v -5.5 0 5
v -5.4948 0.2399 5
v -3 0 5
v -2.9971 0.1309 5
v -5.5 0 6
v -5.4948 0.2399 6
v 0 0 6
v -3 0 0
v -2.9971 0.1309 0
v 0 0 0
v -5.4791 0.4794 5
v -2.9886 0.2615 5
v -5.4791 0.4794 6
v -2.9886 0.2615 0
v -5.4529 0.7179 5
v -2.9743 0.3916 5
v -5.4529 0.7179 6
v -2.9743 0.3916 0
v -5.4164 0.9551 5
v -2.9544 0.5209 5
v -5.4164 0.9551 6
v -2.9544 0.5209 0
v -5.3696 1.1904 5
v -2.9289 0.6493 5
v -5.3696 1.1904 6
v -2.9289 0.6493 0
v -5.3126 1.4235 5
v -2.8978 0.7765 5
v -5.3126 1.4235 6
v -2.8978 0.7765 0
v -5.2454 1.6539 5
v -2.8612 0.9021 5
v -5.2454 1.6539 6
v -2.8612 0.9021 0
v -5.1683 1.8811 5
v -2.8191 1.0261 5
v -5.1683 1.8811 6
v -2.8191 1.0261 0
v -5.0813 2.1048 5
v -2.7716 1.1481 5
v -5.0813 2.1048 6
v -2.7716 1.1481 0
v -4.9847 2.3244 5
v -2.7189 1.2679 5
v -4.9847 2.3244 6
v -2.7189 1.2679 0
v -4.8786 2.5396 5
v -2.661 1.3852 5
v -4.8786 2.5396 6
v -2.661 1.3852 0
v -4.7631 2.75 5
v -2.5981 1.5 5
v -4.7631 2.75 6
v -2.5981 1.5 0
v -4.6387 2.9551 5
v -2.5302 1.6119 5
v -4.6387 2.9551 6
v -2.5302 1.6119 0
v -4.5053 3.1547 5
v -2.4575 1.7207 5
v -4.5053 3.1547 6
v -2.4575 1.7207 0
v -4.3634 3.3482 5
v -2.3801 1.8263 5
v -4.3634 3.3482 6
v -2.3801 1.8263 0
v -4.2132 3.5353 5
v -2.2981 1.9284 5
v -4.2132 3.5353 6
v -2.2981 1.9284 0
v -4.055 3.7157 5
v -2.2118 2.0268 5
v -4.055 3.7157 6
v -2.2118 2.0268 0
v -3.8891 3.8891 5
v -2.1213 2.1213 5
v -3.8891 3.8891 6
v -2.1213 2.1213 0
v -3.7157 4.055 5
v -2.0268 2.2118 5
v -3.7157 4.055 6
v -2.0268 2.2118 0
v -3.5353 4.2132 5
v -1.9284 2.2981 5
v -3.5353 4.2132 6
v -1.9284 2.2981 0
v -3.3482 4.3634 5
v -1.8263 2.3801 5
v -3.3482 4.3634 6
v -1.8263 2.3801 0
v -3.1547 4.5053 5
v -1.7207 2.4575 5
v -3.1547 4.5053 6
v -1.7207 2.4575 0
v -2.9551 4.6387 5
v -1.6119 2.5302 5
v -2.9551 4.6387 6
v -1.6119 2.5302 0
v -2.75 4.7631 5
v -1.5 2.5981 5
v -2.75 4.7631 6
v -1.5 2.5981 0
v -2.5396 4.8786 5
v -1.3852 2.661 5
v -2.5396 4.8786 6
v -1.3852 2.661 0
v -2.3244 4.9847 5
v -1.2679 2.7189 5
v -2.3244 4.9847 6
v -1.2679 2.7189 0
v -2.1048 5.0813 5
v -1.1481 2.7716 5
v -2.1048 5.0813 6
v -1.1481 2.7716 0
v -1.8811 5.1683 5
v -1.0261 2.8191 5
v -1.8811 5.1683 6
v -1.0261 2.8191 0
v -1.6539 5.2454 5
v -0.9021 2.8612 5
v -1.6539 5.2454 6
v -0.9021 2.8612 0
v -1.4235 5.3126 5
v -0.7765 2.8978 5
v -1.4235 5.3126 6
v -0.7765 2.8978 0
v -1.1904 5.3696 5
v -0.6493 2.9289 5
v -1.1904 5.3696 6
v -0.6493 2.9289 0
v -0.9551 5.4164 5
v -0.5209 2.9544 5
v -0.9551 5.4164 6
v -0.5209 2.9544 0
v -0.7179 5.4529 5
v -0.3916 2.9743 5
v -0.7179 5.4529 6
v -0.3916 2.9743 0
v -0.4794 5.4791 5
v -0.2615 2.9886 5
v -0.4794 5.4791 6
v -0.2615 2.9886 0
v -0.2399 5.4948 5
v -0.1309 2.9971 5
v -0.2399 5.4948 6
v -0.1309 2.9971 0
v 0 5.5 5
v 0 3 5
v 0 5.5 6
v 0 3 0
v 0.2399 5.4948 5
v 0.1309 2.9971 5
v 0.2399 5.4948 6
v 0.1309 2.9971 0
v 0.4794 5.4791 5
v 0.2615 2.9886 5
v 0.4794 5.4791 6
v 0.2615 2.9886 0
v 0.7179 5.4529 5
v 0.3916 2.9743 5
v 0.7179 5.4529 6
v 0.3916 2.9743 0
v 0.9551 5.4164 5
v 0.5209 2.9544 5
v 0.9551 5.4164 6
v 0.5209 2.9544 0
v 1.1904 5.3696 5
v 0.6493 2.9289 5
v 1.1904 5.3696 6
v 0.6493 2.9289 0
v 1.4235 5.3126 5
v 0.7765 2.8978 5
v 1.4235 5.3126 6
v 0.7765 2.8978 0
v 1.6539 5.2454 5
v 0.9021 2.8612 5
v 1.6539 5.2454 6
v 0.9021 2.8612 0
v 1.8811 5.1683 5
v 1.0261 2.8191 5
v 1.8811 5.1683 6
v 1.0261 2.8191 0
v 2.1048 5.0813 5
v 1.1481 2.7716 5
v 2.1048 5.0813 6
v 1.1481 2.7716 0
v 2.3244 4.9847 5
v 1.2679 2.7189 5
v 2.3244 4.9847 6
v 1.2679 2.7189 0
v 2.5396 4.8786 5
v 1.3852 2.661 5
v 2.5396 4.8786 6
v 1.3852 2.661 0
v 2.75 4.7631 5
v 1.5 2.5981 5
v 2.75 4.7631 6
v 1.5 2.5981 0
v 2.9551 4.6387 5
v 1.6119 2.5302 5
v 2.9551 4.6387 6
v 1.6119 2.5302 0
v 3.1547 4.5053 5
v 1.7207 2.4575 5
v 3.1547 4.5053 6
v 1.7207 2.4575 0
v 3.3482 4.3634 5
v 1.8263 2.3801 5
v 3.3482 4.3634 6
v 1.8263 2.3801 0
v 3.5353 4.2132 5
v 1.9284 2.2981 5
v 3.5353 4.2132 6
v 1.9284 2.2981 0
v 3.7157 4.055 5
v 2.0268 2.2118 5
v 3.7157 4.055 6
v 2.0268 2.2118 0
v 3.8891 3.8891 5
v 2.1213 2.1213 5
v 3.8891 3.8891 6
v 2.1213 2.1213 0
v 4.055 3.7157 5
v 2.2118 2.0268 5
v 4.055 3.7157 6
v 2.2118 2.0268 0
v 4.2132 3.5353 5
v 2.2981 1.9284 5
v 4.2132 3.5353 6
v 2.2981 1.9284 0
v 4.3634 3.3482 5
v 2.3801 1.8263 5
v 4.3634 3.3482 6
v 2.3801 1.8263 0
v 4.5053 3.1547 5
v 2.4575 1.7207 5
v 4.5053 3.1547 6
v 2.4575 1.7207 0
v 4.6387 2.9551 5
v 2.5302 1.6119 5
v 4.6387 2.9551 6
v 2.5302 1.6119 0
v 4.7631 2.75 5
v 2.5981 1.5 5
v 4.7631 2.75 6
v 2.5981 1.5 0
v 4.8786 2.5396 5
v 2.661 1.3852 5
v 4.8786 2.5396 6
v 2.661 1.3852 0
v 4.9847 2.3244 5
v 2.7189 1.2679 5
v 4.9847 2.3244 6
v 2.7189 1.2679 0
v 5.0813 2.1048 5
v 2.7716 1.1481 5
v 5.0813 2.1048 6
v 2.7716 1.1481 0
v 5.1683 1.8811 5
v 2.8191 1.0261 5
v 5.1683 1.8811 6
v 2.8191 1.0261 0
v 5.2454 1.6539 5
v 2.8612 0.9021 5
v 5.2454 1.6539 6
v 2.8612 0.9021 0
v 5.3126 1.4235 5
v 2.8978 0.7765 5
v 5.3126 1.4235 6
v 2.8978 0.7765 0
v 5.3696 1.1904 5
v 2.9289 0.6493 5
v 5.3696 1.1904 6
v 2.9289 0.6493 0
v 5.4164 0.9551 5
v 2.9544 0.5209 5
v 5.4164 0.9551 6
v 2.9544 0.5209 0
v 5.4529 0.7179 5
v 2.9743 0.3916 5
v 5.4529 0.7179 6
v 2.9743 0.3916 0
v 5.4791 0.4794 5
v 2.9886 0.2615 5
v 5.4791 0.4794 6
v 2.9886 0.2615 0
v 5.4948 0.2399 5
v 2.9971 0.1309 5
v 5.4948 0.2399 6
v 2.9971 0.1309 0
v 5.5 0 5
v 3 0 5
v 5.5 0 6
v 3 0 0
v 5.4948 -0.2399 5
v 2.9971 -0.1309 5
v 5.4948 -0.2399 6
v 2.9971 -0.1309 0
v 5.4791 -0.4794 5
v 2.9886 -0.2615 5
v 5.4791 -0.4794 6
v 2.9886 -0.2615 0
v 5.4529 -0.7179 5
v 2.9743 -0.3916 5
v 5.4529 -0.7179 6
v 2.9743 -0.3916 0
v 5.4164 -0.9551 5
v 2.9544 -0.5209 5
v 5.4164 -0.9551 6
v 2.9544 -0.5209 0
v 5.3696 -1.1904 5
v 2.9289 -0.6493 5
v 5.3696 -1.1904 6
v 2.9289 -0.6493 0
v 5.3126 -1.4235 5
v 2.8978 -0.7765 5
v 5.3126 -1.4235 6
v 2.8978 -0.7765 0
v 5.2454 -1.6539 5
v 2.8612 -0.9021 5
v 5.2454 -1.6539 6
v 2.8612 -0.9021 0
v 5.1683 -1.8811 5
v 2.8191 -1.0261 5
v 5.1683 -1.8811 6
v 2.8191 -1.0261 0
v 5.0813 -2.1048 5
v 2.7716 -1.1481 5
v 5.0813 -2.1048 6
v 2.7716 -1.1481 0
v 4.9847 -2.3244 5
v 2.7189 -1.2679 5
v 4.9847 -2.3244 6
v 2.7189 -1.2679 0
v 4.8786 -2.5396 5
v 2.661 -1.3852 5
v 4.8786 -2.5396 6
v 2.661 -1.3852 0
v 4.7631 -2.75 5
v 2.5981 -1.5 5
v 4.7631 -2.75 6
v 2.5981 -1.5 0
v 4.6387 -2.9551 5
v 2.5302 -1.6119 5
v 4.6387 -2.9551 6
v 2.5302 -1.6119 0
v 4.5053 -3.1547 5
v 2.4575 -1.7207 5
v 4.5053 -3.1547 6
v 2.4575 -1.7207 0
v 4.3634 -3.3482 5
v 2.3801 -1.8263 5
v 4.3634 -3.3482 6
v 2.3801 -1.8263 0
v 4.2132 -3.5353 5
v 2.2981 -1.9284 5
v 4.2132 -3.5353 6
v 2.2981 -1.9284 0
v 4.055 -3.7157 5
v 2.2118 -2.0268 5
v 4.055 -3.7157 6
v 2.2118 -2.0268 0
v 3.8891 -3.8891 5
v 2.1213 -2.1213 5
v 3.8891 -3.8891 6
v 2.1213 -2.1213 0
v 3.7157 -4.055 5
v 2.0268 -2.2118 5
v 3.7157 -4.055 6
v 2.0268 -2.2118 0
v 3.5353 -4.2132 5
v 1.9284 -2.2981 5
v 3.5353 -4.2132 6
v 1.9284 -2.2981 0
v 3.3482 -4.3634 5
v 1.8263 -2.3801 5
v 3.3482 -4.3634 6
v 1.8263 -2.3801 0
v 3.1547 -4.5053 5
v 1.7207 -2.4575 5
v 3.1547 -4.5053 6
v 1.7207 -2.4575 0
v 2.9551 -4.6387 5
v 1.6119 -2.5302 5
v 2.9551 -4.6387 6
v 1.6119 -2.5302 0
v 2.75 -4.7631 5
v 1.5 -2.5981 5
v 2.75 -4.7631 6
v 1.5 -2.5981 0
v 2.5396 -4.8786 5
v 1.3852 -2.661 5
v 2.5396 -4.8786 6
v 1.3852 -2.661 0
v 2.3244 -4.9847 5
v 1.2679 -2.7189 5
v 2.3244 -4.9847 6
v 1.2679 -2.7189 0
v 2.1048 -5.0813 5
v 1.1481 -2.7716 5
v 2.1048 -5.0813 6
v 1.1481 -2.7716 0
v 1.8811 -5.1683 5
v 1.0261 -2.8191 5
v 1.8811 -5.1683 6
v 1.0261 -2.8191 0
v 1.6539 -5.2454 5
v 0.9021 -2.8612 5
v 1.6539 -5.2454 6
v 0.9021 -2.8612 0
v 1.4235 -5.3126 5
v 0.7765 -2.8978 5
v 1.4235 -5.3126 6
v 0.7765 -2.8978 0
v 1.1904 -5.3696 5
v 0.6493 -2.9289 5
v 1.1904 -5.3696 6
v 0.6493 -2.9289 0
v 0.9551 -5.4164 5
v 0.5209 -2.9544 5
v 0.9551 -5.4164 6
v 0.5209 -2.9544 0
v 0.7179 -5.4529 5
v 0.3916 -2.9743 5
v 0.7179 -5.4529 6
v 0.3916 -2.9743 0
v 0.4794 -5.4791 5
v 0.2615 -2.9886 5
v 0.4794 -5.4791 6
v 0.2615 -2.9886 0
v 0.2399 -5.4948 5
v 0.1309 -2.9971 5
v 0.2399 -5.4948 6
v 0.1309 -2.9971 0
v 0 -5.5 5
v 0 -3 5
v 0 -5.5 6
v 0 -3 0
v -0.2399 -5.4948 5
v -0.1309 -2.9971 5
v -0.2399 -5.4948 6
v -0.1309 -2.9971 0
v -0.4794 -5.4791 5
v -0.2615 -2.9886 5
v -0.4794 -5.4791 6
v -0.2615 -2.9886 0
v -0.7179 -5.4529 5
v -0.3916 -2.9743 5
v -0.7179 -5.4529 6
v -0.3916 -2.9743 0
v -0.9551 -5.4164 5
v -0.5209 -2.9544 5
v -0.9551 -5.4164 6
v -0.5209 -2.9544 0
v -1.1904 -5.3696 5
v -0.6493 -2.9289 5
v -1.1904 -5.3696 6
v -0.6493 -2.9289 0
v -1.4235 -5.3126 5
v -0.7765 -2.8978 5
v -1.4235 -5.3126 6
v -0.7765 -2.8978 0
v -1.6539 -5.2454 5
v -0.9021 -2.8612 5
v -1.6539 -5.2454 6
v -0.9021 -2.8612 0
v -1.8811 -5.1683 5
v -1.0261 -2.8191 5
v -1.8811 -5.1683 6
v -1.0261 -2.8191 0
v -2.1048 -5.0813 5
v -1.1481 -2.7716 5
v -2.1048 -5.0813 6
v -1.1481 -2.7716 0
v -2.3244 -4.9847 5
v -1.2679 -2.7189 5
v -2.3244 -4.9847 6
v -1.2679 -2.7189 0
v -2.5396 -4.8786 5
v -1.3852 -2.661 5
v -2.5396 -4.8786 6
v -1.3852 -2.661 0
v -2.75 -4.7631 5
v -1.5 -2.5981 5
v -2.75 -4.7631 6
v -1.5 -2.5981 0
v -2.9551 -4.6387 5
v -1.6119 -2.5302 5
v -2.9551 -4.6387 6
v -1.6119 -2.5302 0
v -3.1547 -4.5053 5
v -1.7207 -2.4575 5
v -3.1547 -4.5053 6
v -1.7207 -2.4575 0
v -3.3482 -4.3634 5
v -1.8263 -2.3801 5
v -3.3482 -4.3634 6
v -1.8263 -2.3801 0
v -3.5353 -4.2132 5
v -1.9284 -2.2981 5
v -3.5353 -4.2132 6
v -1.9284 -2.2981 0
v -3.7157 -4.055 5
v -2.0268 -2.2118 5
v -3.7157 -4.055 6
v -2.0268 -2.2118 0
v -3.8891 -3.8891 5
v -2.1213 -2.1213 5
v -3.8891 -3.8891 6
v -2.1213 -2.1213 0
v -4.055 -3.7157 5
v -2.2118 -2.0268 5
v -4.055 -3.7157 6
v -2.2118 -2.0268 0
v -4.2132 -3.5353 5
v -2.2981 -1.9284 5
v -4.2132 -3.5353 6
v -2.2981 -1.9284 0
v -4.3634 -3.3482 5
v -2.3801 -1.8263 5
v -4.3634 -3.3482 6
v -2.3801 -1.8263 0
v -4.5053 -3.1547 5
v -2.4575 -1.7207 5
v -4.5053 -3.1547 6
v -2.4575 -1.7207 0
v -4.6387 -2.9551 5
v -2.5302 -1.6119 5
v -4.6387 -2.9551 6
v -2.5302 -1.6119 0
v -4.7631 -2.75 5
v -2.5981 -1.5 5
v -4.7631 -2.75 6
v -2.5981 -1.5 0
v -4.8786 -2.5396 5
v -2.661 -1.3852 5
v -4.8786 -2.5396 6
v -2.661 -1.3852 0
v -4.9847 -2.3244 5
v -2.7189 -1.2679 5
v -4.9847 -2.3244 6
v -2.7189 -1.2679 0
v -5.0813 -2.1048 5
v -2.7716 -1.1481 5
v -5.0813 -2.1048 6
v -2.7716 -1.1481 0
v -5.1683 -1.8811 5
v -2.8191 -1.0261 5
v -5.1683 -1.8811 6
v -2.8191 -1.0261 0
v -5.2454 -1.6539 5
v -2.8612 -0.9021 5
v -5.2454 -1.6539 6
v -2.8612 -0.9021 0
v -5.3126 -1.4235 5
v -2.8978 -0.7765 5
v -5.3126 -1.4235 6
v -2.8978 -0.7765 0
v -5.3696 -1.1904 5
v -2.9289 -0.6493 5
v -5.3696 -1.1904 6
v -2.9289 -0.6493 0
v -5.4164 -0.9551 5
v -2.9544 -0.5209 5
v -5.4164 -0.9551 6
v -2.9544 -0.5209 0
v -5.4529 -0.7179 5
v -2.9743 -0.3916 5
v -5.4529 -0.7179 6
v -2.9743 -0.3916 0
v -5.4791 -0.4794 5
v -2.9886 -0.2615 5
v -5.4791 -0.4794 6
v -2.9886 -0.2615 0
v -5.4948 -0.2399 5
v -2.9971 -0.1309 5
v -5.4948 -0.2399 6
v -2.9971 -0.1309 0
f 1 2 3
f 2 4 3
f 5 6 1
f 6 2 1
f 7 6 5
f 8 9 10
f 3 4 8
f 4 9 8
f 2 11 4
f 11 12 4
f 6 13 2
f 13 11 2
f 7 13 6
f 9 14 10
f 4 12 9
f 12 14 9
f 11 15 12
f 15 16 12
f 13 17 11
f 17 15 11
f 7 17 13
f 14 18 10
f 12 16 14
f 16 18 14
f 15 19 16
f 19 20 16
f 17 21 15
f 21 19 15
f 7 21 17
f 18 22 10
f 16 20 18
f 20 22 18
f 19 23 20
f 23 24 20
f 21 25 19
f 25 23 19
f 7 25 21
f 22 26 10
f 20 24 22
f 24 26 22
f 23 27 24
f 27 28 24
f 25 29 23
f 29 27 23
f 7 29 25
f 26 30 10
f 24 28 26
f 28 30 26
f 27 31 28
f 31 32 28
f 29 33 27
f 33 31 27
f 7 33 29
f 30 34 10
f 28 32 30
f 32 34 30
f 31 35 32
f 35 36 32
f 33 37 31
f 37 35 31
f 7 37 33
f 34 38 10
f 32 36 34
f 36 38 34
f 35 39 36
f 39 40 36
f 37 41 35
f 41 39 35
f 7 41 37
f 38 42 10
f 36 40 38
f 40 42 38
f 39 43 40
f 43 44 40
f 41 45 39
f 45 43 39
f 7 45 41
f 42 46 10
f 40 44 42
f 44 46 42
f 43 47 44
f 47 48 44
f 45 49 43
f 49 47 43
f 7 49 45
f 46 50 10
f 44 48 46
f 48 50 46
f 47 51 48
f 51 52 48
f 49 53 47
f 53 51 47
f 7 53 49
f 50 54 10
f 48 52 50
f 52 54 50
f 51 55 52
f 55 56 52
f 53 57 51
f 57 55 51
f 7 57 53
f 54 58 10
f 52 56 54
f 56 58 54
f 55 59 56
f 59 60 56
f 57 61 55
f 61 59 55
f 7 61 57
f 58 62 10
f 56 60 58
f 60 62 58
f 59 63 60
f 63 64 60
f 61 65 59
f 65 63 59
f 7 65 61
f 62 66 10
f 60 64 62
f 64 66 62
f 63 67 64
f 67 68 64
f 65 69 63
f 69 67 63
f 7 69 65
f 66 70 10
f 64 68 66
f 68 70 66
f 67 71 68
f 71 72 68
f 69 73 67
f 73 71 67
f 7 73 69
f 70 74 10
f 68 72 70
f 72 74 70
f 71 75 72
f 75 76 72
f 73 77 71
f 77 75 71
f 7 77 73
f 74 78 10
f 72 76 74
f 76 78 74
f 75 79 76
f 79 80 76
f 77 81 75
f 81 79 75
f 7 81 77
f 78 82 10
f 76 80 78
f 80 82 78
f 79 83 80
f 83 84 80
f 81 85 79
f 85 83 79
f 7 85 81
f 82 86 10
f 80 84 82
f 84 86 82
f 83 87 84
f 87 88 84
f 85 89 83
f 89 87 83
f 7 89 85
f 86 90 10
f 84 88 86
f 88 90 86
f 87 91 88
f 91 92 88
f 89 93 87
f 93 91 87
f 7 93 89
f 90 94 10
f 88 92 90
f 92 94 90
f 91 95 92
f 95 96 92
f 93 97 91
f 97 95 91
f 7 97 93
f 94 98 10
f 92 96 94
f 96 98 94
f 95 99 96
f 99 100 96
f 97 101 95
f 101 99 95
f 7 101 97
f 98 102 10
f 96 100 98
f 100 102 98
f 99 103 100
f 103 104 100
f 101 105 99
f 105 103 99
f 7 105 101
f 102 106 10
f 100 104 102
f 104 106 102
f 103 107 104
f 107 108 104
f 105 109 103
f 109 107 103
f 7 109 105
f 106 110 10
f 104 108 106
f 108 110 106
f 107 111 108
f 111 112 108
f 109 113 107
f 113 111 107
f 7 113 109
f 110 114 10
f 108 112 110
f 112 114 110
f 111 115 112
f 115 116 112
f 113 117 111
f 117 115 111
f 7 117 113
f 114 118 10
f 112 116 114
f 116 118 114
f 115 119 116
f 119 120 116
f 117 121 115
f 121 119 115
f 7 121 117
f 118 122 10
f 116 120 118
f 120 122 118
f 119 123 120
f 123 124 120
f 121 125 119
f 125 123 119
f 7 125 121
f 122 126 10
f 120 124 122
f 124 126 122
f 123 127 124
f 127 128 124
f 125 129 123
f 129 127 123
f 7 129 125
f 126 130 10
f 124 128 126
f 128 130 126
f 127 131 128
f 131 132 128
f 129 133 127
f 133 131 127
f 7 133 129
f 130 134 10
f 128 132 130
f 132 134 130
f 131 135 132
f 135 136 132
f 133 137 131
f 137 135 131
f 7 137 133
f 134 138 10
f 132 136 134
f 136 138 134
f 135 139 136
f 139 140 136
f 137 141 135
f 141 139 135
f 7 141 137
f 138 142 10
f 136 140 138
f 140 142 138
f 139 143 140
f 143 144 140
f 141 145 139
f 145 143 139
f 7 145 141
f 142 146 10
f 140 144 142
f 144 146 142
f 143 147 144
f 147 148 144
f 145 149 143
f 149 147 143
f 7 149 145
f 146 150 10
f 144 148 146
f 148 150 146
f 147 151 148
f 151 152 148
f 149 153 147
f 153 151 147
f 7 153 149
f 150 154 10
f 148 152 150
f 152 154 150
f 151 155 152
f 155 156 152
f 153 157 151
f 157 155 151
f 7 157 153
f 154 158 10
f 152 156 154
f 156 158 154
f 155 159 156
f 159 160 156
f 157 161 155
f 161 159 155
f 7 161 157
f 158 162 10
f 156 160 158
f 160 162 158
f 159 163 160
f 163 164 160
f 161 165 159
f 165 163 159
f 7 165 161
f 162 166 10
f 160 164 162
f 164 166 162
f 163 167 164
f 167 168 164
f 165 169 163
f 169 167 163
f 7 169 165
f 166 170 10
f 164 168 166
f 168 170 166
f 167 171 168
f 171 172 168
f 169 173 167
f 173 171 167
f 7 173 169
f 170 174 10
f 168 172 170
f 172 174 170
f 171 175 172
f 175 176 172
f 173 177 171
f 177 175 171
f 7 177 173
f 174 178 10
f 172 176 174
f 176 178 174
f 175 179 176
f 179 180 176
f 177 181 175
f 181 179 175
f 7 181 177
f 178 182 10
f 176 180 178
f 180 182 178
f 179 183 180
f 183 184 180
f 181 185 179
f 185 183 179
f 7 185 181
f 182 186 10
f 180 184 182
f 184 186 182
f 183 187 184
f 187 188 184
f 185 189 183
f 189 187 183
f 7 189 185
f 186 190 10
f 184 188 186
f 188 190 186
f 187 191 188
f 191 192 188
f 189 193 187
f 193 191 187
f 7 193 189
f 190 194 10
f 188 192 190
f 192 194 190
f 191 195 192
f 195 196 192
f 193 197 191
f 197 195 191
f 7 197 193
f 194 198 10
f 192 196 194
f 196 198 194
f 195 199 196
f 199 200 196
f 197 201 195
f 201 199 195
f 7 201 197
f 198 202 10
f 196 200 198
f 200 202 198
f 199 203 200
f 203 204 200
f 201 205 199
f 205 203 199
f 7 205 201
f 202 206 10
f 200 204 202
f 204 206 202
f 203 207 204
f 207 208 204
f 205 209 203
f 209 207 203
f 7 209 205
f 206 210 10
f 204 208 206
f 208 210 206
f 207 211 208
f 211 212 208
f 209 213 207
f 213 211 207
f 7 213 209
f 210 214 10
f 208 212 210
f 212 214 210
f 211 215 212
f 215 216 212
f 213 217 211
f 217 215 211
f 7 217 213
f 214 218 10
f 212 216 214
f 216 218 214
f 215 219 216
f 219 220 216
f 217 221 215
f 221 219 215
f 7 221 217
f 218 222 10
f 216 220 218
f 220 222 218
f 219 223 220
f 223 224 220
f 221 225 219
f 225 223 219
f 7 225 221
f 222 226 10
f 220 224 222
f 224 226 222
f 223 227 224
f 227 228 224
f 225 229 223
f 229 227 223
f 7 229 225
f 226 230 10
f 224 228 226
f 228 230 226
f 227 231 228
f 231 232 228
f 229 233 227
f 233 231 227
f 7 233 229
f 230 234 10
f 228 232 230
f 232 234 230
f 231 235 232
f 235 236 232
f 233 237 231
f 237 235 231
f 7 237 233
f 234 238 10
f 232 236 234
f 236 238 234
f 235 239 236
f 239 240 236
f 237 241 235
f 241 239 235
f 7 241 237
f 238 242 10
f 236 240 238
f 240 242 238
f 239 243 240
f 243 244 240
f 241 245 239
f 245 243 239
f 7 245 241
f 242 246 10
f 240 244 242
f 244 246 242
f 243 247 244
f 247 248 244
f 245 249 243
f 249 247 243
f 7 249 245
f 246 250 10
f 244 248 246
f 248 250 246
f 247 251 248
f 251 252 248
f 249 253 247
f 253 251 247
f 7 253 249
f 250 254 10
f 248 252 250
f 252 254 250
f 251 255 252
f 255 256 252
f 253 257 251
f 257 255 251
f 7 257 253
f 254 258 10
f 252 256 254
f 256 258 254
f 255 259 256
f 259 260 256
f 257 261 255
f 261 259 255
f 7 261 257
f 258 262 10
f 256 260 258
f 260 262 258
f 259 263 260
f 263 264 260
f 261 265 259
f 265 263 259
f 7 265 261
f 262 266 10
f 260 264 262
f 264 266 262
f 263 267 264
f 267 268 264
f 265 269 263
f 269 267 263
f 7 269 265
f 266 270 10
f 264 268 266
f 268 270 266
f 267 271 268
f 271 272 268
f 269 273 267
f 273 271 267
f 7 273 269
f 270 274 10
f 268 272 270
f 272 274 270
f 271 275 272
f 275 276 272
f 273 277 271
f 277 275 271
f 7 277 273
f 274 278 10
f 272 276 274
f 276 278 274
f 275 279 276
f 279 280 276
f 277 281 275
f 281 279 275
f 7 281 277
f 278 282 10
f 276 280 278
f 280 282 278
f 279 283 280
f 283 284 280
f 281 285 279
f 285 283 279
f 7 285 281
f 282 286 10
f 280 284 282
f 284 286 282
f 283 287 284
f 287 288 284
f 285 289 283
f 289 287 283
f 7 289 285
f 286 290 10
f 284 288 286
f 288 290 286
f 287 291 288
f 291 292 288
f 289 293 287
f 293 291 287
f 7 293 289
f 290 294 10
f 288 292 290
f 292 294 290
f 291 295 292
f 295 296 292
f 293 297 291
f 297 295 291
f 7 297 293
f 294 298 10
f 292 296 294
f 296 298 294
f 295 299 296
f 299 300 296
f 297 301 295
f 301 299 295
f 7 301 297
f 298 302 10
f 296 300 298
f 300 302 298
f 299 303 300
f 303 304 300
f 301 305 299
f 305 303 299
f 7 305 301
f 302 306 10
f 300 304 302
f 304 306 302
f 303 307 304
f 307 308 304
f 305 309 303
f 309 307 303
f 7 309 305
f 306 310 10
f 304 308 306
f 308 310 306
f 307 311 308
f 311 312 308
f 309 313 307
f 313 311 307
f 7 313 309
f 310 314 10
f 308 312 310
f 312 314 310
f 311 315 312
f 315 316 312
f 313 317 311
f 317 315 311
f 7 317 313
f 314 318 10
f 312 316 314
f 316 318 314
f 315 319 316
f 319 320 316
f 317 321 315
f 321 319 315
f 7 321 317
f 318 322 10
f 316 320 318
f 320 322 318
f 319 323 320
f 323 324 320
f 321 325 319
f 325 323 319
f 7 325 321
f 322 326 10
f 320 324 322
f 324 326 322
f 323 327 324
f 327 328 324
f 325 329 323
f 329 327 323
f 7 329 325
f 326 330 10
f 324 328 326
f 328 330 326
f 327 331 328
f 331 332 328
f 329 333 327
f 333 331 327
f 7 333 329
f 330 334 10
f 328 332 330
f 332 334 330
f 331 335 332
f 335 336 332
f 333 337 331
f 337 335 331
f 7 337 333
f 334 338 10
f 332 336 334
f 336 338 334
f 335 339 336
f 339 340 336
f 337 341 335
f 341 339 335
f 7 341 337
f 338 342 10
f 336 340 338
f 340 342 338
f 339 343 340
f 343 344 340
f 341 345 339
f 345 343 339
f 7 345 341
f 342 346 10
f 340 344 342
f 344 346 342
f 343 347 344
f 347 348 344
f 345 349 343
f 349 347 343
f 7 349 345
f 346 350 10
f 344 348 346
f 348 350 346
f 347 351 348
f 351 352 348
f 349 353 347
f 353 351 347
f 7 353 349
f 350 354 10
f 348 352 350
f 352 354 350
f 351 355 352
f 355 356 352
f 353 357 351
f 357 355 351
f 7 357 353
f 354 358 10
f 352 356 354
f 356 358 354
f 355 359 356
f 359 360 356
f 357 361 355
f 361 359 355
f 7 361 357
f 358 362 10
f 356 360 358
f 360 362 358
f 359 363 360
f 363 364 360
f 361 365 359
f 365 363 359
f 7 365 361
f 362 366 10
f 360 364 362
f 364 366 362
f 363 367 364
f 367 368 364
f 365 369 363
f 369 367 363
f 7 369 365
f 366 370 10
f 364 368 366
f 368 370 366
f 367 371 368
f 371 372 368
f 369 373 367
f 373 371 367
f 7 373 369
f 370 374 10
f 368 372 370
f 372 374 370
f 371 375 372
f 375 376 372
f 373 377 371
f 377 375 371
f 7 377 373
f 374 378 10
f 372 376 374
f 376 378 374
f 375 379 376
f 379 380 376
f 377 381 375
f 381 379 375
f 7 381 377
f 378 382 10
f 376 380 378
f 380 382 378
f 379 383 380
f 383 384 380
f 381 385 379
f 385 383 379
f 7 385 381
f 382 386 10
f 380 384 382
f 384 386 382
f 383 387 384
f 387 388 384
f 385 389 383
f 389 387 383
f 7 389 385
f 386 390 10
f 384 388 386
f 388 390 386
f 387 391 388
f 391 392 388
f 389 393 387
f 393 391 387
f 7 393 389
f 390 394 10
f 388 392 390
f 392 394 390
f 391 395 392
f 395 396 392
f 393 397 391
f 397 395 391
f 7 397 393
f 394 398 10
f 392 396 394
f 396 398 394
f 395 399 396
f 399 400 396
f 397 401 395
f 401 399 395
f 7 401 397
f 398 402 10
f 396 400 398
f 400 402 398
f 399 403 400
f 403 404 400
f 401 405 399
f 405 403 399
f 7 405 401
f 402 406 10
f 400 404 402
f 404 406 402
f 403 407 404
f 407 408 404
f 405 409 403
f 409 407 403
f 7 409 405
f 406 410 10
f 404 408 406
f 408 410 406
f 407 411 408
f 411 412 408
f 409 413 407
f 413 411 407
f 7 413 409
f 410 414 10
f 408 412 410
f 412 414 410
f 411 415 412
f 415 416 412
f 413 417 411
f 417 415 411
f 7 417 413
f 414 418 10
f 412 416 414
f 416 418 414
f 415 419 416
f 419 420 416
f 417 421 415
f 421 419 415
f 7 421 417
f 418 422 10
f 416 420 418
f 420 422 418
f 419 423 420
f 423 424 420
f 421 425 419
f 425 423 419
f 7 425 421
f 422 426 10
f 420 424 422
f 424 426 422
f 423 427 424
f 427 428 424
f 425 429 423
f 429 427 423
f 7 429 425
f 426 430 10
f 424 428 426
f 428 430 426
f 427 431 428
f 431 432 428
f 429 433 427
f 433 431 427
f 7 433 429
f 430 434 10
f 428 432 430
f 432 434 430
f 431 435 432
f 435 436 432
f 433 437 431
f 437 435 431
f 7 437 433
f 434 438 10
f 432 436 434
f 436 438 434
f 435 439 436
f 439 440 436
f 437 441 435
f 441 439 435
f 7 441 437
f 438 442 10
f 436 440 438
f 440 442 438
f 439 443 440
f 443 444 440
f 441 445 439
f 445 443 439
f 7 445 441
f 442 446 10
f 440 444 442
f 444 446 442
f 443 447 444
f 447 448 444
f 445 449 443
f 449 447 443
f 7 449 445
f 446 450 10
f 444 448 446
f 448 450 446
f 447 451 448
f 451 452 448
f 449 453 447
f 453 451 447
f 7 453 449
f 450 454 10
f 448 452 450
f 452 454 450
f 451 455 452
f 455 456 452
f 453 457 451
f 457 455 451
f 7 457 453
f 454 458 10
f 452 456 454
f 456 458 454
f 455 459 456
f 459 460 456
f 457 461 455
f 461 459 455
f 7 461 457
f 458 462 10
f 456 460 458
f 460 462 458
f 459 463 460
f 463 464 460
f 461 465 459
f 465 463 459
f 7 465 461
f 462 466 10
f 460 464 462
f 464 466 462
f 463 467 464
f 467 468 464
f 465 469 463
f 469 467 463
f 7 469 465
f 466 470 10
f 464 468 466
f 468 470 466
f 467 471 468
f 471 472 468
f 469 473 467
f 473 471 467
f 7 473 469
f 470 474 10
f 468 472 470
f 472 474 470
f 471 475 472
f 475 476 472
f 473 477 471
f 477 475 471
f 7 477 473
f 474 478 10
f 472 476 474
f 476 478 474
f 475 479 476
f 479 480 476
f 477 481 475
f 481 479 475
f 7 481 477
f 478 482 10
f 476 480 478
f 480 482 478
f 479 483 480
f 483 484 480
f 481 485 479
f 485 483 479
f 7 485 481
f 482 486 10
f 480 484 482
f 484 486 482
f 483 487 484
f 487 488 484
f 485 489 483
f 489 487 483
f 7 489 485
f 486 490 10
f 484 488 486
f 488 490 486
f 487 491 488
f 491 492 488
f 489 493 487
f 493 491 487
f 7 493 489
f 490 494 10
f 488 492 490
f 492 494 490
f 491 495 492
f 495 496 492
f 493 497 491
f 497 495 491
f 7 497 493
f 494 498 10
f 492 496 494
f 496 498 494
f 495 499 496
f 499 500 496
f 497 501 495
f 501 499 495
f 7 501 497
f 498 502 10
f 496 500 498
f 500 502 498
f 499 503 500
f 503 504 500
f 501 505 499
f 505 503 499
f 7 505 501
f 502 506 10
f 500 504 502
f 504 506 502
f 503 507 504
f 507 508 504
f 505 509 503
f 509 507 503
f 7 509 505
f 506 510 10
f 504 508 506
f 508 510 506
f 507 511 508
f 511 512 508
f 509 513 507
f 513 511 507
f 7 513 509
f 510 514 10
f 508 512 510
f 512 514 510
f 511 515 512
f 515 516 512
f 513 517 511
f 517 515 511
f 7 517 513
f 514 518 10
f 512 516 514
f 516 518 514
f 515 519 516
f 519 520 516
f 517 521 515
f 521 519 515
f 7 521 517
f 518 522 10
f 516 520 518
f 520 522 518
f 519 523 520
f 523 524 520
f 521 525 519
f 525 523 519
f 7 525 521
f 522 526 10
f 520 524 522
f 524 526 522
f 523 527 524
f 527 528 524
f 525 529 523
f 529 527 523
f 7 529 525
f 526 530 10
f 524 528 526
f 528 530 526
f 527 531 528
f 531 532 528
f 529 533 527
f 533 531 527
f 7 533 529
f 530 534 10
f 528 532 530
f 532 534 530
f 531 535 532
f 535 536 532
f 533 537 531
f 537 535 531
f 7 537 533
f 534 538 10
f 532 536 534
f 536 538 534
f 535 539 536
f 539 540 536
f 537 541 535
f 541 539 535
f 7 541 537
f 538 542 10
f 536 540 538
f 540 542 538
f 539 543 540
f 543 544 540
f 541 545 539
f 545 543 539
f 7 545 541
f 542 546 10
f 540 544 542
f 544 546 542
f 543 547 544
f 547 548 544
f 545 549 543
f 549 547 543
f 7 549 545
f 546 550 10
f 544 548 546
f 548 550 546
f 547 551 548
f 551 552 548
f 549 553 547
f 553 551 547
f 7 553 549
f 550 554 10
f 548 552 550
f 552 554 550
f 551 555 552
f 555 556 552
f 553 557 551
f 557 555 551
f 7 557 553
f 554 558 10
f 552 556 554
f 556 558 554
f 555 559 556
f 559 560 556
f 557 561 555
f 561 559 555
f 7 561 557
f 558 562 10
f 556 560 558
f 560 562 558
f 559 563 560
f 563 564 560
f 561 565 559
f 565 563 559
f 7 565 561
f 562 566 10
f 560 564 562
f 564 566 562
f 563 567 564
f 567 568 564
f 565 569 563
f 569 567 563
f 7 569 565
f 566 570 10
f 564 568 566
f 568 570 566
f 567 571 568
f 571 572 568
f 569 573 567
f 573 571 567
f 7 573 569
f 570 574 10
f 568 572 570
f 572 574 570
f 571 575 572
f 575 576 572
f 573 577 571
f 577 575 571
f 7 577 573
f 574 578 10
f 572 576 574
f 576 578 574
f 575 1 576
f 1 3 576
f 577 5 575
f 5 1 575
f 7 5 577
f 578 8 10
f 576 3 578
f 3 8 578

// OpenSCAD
// #210-001 / #210-003 Idler Plug — parametric source.
// The plug the Belt Director Pulley's bearing turns on, pushed through the Arm Body's D column and
// held by an M2 x 20 bolt (specs/008.5 steps 8-10). This one file serves both part numbers
// (PART-INDEX § One geometry, two part numbers).
//
//   config = "previous" — a faithful recreation of the reference mesh
//                         (../Reference/meshes/200-ArmBody/), in that mesh's frame.
//   config = "revised"  — the same part. Its fits wait for the arm body's assembly (below).
//
// FRAME. The reference's own: the axis on +Z through the origin, the shank's end at z = 0.
//
// Measured from the reference with scadmesh profile/radial/planes. The feature IDs are those of
// 210-001_IdlerPlug.view.json:
//
//     ID  feature   value     z span
//     S1  shank     Ø6.000    0 .. 5, solid
//     H1  head      Ø11.000   5 .. 6
//
// FITS, deferred: S1 is Ø6.000, but specs/008.5 puts an MR85 (Ø5 bore) on it, and the D column's
// upper plate has a Ø5 hole. Which of the three is right is settled with the arm body's assembly
// (armbody_assembly), so revised draws no fit yet.

/* [Configuration] */
// Parameter set: previous (reference) or revised
config = "previous"; // [previous, revised]

/* [Hidden] */
$fn = 144;

SHANK = [3.000, 5.000];    // radius, top
HEAD  = [5.500, 6.000];    // radius, top

module idler_plug(cfg = config)
    rotate_extrude() polygon([[0, 0], [SHANK[0], 0], [SHANK[0], SHANK[1]],
                              [HEAD[0], SHANK[1]], [HEAD[0], HEAD[1]], [0, HEAD[1]]]);

idler_plug();
